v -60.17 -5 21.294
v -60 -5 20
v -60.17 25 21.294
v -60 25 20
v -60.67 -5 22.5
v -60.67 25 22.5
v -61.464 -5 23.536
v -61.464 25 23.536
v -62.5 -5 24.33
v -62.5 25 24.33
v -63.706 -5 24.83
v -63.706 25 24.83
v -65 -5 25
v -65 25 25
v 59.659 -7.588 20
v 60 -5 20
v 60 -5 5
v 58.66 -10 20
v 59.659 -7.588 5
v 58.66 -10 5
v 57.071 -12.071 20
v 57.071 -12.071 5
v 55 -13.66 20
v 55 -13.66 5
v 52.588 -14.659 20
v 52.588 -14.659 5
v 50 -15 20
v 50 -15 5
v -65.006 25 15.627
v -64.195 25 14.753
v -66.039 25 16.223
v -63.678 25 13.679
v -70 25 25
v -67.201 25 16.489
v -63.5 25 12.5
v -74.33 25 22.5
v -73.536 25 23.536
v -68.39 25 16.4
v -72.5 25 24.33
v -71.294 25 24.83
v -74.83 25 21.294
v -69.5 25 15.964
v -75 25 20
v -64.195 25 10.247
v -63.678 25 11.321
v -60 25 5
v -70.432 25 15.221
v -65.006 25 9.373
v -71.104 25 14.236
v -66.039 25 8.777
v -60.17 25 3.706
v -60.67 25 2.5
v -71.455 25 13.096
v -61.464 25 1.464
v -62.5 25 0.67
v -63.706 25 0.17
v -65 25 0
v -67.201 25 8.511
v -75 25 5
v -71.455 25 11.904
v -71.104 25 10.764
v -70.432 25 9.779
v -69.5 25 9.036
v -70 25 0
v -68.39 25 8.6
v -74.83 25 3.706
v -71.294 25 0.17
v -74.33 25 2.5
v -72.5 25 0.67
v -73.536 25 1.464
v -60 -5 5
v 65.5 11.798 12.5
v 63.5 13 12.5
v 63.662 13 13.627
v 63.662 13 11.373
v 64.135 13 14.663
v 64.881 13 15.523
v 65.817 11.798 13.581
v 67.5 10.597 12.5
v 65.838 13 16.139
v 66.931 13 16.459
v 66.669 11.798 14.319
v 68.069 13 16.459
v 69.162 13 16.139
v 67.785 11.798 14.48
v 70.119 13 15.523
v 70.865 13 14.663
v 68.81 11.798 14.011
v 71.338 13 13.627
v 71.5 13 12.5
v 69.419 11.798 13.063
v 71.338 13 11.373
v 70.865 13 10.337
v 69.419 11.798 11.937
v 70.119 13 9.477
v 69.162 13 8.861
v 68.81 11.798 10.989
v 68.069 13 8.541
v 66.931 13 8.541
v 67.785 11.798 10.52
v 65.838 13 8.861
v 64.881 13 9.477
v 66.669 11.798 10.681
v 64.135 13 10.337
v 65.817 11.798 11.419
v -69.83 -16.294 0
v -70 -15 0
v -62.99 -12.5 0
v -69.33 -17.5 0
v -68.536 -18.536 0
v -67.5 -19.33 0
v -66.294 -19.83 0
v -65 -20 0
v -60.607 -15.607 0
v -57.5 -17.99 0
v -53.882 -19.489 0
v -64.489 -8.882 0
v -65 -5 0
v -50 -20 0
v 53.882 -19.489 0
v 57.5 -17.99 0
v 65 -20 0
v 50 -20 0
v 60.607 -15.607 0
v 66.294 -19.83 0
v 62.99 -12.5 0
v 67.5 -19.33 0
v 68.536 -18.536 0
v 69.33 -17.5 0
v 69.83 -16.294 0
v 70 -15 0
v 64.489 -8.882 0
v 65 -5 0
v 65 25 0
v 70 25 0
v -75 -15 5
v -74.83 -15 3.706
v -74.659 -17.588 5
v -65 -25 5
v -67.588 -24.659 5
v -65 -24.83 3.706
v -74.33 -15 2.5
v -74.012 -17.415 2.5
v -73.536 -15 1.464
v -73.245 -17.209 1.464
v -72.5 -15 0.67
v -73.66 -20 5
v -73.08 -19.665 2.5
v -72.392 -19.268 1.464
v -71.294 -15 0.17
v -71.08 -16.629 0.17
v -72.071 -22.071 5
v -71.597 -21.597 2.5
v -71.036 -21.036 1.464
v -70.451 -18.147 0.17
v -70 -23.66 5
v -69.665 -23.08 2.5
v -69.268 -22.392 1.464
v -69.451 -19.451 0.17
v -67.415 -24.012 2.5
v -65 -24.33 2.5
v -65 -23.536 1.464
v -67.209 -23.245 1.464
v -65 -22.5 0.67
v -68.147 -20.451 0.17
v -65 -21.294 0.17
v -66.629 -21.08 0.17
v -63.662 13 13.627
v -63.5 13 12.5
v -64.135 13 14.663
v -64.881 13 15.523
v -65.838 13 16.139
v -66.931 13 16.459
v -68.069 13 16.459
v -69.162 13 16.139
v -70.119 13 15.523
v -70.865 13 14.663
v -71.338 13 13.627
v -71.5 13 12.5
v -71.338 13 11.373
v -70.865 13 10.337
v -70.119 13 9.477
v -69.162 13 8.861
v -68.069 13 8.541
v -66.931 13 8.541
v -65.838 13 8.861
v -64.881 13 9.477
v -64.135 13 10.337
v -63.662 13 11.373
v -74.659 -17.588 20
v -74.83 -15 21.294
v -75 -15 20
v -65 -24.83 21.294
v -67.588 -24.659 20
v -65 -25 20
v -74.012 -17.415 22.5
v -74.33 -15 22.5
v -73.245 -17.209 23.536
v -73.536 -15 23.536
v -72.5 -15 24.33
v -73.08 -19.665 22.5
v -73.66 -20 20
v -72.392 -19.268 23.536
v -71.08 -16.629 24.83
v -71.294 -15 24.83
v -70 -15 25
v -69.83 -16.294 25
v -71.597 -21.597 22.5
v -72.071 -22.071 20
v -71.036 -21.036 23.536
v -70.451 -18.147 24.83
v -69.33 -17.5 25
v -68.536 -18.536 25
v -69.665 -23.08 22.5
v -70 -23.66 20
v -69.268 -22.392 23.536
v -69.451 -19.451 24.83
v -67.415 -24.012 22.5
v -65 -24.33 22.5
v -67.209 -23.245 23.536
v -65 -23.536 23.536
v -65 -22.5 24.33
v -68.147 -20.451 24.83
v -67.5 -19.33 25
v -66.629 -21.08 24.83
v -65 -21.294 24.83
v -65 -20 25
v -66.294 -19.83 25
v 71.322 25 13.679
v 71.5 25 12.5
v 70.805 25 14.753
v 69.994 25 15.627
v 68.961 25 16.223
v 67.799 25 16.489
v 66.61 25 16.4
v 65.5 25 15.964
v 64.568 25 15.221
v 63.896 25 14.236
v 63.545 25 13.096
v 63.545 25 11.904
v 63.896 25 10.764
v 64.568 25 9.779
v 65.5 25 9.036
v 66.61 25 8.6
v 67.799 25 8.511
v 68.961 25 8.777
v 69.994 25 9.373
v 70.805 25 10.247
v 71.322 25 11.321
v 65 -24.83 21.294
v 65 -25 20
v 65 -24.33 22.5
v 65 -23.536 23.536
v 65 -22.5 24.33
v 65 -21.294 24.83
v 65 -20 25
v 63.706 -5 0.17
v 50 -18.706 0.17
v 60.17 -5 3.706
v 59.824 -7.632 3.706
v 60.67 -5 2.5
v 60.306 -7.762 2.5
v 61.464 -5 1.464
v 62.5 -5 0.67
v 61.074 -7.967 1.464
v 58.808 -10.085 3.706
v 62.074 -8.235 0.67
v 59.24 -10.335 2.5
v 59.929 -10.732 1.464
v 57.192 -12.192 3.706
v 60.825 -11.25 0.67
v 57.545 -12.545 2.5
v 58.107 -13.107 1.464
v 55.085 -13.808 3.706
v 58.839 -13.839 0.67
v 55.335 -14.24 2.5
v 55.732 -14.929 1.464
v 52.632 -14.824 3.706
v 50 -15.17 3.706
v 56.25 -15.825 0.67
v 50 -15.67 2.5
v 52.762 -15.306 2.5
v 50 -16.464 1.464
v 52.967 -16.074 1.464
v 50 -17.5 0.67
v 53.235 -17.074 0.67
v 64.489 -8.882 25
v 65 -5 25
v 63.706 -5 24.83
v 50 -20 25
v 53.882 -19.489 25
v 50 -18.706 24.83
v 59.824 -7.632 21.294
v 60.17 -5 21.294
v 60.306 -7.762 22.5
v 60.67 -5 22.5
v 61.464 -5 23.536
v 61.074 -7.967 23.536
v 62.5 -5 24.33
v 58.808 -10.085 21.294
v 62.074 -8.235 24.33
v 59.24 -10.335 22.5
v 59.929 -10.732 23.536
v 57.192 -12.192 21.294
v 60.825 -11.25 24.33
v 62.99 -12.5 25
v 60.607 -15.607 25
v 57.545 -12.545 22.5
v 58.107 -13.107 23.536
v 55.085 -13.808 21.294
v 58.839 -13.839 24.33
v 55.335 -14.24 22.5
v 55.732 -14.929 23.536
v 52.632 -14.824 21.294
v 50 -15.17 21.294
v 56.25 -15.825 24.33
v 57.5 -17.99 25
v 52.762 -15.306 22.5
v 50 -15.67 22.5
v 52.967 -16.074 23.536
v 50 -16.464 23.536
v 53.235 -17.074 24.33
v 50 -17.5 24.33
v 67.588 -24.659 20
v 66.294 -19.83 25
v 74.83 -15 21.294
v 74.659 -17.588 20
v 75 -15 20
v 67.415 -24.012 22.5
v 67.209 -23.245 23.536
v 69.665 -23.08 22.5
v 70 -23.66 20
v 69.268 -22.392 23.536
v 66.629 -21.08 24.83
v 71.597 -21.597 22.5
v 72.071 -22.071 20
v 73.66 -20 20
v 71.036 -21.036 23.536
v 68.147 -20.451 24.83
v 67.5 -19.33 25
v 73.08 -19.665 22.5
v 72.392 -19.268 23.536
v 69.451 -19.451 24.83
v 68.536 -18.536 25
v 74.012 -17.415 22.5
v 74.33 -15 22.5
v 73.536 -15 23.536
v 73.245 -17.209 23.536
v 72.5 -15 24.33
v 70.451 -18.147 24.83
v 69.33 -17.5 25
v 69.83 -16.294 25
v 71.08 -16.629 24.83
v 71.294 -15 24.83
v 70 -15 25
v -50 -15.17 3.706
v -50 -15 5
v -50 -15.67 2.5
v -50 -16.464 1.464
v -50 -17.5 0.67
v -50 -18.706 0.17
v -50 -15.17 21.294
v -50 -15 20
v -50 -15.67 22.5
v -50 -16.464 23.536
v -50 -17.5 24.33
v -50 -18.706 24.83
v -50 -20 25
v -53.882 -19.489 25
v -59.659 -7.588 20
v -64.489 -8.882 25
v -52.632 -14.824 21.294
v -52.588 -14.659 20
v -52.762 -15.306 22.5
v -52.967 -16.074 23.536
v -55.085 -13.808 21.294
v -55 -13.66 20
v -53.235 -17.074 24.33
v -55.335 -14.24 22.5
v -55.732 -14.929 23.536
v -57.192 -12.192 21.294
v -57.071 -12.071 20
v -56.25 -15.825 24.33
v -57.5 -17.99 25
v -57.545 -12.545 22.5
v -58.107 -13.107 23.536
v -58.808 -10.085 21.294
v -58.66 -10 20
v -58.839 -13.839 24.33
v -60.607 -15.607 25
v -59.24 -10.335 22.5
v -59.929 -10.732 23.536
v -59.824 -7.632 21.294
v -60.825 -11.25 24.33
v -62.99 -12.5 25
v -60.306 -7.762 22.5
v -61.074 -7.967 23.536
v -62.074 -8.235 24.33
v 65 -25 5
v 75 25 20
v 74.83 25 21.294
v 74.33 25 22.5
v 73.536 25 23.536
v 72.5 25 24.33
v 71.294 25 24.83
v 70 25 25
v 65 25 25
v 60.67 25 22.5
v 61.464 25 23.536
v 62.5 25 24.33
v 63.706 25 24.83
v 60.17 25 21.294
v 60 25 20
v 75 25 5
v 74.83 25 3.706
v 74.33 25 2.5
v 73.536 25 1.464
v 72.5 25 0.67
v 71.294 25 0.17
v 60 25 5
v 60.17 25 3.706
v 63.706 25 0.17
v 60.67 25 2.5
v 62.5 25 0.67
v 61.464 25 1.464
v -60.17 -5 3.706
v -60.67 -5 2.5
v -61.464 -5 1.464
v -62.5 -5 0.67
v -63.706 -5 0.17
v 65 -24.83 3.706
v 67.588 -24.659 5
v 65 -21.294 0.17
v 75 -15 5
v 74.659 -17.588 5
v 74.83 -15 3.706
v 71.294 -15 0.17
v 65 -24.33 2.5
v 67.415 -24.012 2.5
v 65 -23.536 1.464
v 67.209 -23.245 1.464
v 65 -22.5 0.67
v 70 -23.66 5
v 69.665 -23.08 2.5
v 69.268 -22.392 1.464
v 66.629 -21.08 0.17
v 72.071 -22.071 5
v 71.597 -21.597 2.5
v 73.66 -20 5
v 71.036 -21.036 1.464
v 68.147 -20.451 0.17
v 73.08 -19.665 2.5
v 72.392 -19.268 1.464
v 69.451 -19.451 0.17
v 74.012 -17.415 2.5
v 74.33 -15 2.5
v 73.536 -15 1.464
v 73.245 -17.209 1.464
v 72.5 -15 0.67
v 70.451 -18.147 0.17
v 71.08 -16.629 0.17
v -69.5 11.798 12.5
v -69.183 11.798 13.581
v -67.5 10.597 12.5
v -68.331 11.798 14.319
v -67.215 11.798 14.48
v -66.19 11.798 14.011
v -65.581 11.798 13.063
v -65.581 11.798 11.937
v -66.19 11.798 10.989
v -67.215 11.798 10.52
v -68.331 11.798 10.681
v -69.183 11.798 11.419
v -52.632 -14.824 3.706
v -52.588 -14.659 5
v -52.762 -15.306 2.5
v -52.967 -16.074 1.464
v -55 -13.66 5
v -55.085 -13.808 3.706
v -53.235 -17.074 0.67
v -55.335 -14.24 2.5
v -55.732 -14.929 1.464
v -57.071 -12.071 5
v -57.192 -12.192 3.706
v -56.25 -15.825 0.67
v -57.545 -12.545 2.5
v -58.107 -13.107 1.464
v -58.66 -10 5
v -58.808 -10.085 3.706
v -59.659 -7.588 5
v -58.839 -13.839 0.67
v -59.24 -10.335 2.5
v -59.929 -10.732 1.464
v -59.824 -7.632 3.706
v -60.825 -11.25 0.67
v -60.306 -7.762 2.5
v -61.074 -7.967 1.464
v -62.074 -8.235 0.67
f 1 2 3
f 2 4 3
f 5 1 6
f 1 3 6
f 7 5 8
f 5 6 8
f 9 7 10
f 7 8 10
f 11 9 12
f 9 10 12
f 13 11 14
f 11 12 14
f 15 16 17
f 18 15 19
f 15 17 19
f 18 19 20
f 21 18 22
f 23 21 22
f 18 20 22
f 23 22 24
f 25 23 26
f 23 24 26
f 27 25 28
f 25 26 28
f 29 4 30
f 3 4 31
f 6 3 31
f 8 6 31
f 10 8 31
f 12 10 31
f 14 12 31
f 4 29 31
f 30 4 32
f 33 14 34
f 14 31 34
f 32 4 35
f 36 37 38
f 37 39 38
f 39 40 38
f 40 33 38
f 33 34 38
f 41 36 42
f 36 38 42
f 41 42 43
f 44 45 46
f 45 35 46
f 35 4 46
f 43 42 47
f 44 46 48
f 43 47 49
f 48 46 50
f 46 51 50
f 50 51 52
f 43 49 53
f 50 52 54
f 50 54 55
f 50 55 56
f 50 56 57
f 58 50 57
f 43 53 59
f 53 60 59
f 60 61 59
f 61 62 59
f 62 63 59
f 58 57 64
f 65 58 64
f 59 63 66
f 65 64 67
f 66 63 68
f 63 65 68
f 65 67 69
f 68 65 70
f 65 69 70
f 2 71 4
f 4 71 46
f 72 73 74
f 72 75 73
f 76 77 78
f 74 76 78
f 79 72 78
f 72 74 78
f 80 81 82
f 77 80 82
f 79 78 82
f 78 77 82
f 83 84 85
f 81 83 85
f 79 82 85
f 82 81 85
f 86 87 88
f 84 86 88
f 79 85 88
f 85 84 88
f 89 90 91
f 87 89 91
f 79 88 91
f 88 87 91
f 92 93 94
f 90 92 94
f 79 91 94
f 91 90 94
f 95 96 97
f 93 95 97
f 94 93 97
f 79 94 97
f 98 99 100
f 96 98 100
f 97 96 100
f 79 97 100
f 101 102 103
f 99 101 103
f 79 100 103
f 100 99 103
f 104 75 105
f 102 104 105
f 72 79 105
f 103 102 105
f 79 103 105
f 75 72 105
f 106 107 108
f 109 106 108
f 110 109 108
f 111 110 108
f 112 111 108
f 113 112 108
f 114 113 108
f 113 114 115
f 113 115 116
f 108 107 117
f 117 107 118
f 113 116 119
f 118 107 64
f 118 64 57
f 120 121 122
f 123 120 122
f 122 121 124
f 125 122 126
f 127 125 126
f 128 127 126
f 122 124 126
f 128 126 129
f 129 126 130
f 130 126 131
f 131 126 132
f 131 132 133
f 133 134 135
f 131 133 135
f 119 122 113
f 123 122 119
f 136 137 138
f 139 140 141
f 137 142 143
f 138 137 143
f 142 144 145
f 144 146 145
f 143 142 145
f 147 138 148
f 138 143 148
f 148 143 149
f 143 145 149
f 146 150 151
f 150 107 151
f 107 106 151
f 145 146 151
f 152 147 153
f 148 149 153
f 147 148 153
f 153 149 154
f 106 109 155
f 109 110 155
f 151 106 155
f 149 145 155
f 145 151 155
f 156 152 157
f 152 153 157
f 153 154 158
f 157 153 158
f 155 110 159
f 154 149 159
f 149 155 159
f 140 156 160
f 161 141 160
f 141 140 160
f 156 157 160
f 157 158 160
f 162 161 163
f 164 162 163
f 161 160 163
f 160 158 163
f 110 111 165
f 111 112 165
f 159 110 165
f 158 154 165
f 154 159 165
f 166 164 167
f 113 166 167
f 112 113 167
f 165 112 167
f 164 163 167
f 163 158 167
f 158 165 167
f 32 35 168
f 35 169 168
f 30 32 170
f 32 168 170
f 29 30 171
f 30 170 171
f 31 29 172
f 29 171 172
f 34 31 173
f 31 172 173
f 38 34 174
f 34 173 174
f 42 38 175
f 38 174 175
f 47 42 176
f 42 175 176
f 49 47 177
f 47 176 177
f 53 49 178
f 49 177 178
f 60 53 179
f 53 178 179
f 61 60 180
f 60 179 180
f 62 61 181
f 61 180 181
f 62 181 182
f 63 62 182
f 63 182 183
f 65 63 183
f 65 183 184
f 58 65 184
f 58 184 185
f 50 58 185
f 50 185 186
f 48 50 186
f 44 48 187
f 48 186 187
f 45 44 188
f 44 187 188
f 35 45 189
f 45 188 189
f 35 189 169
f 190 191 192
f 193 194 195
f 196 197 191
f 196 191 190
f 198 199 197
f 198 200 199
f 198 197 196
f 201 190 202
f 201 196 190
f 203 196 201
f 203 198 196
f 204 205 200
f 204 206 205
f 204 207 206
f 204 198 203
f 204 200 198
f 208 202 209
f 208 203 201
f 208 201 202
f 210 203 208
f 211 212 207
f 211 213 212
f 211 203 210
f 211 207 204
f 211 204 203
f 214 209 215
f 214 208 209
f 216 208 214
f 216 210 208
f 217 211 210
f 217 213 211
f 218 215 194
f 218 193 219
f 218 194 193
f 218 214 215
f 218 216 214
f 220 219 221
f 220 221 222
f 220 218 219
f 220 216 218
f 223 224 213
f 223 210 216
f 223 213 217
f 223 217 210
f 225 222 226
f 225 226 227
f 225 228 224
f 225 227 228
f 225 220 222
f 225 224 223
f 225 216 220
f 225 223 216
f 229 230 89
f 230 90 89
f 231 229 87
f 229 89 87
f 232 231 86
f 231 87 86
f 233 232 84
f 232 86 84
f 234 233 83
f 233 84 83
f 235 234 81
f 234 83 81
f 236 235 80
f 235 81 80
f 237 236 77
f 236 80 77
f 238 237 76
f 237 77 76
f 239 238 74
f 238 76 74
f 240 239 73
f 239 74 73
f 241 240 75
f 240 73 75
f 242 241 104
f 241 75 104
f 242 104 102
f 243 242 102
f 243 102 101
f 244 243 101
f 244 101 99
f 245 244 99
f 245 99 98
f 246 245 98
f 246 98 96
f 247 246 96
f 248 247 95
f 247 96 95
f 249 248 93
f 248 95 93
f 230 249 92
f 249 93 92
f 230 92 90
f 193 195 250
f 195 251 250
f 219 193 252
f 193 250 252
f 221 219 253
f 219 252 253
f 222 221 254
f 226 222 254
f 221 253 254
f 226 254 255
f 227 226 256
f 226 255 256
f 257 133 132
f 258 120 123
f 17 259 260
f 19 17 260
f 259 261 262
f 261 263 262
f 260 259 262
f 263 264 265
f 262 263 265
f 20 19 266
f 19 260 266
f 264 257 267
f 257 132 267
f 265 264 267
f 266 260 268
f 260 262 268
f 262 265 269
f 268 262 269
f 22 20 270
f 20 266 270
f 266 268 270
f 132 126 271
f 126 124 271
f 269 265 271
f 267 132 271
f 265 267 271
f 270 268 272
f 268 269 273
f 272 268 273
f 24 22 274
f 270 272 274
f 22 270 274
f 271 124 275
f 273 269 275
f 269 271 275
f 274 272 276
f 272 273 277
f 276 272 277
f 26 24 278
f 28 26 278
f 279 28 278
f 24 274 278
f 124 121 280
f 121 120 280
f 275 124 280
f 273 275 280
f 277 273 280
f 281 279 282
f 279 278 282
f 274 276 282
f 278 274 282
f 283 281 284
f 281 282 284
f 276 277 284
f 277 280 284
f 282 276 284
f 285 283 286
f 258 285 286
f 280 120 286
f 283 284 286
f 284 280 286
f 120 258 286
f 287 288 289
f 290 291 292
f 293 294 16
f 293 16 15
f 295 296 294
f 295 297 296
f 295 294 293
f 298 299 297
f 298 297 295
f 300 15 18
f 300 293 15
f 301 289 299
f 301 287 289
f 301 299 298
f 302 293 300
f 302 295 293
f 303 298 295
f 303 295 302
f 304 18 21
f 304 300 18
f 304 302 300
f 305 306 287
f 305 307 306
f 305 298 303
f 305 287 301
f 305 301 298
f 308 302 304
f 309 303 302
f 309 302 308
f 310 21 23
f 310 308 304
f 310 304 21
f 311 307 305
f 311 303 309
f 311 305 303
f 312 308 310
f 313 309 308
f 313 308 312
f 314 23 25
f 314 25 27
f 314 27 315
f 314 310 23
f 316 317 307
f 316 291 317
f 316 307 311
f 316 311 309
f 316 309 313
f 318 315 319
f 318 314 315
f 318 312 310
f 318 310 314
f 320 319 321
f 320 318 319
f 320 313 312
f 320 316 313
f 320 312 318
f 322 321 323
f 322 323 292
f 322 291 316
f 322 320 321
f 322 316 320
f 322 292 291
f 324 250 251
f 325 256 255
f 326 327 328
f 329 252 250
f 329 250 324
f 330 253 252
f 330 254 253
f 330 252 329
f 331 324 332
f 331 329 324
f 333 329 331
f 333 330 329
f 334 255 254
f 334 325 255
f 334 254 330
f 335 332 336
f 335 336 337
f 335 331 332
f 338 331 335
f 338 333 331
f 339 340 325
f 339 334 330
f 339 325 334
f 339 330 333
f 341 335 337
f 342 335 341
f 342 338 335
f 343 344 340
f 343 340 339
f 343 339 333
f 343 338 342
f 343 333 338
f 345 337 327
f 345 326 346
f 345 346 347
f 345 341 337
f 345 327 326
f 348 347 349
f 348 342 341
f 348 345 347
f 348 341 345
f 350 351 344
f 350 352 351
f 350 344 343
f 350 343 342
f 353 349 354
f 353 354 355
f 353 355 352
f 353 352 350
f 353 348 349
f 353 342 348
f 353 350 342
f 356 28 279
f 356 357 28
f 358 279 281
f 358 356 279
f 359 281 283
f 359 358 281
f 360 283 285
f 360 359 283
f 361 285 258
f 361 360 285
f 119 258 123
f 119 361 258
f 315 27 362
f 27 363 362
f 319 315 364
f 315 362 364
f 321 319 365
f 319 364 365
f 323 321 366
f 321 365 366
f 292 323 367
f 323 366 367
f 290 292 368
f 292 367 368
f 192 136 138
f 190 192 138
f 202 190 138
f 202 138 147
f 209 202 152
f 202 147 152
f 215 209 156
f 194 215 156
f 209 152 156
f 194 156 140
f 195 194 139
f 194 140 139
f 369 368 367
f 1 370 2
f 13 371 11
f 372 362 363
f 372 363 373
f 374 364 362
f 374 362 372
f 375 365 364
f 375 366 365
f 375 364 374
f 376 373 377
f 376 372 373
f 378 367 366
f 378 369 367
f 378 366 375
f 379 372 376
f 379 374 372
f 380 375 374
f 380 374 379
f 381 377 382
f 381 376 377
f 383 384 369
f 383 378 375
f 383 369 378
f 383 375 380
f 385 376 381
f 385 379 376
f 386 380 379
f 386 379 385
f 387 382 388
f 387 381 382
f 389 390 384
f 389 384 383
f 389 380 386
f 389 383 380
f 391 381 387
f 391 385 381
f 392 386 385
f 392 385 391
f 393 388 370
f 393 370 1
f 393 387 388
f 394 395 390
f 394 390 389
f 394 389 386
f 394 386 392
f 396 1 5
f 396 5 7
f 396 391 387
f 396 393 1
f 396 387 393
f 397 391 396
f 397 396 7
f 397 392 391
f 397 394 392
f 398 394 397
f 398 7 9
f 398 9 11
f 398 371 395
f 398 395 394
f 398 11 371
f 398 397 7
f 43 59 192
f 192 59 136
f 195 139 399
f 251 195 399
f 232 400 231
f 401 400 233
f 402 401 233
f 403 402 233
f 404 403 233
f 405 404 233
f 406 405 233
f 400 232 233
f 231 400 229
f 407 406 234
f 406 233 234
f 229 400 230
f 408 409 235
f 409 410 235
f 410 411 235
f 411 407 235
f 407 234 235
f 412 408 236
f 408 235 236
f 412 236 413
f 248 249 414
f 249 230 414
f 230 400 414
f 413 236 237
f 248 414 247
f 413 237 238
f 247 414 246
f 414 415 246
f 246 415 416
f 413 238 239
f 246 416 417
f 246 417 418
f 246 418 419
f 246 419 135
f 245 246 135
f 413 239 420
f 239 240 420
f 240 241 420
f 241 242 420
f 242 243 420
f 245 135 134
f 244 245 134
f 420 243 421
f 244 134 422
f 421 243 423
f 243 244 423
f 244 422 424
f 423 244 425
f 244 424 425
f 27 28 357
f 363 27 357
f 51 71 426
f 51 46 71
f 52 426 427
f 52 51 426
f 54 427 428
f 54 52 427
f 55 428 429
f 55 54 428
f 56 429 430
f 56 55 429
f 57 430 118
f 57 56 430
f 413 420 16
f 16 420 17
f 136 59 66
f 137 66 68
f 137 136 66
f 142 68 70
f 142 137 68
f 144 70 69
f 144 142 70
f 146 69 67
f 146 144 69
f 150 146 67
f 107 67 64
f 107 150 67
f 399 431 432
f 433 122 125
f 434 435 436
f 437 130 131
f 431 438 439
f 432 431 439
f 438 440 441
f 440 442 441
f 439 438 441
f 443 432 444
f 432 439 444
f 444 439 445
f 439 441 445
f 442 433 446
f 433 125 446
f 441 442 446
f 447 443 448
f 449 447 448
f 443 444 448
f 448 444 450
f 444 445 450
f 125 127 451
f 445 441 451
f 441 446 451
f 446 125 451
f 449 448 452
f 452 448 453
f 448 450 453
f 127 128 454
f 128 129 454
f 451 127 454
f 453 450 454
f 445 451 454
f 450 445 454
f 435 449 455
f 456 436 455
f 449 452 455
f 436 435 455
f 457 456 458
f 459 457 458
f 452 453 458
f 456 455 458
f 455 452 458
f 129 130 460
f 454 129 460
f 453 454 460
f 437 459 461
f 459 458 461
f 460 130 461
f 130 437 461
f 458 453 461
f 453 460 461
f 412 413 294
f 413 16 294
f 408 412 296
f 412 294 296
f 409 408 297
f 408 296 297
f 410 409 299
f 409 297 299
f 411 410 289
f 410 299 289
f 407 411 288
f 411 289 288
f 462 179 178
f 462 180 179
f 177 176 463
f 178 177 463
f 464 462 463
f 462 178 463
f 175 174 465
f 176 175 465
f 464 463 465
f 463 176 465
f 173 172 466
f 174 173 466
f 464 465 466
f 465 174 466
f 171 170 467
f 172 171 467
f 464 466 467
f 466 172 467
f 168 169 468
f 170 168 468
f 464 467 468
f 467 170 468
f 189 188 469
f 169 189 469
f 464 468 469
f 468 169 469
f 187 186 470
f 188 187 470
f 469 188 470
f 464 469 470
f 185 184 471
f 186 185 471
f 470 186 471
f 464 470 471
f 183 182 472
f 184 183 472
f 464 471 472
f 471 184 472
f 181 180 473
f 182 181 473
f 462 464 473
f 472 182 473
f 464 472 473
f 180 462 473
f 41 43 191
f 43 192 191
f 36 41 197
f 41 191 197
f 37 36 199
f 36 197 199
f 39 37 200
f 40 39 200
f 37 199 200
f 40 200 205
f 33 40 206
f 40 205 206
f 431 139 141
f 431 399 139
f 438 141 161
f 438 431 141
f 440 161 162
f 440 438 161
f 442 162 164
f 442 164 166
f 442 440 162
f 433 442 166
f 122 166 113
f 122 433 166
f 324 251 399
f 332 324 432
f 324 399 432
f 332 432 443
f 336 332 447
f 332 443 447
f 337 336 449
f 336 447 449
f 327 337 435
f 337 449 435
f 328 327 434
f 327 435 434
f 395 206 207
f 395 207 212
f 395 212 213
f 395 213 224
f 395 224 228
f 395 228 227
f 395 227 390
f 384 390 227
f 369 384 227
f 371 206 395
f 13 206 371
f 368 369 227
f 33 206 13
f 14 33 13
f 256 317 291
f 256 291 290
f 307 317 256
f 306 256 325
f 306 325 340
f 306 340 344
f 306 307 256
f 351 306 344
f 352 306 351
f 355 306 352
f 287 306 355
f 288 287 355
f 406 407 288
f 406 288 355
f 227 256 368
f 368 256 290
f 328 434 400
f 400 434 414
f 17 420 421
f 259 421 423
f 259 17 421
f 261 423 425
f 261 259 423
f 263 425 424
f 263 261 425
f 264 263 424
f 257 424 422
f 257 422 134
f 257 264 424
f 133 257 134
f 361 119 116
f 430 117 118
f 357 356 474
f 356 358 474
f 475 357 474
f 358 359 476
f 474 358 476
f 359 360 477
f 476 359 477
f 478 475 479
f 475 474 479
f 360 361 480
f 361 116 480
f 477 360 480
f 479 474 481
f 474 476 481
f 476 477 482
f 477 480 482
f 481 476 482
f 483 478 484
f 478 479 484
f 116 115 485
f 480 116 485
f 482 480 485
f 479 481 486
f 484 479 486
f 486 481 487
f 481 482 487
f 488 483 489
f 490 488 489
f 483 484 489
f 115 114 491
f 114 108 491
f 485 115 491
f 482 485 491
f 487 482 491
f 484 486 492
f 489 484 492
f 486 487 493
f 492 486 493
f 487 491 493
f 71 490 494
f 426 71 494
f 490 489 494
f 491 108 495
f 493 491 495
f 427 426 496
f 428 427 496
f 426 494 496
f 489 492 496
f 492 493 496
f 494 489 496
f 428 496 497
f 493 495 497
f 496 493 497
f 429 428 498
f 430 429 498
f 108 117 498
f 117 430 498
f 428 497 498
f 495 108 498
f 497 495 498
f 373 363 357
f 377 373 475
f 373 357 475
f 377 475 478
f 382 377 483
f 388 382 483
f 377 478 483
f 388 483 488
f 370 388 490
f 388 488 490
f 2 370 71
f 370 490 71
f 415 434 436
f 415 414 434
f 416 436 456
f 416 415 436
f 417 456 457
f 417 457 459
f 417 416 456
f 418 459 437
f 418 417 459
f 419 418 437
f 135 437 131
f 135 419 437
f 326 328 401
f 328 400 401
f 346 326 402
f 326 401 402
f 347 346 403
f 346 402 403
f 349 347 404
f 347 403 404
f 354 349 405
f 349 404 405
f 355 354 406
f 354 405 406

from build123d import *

# Parameters (mm, degrees)
F1_DEPTH = 25
F2_R     = 4.99999
F4_D     = 8
F4_DEPTH = 12
F4_TIP   = 2.4034424761
F6_D     = 8
F6_DEPTH = 12
F6_TIP   = 2.4034424761


# Not quite as in the source:
# - a fillet or chamfer is up to 0.001 mm smaller than in the source, because OpenCascade refuses the exact size


with BuildPart() as f1:
    # F0 (on Top) → F1 (new body)
    with BuildSketch(Plane.XY):
        with BuildLine():
            Line((75, -15), (75, 25))
            Line((75, 25), (60, 25))
            Line((60, 25), (60, -5))
            ThreePointArc((60, -5), (57.0710678119, -12.0710678119), (50, -15))
            Line((50, -15), (-50, -15))
            ThreePointArc((-50, -15), (-57.0710678119, -12.0710678119), (-60, -5))
            Line((-60, -5), (-60, 25))
            Line((-60, 25), (-75, 25))
            Line((-75, 25), (-75, -15))
            ThreePointArc((-75, -15), (-72.0710678119, -22.0710678119), (-65, -25))
            Line((-65, -25), (65, -25))
            ThreePointArc((65, -25), (72.0710678119, -22.0710678119), (75, -15))
        make_face()
    extrude(amount=F1_DEPTH)

    # F2 (radius 5 in the source; OpenCascade refuses exactly that, so slightly less here)
    f2_edges = [f1.edges().sort_by_distance(p)[0] for p in [
        (-57.071068, -12.071068, 0),
        (-57.071068, -12.071068, 25),
        (-72.071068, -22.071068, 0),
        (-72.071068, -22.071068, 25),
    ]]
    fillet(f2_edges, radius=F2_R)

    # F4
    with Locations(Plane(origin=(0, 25, 0), x_dir=(-1, 0, 0), z_dir=(0, 1, 0))):
        with Locations((67.5, 12.5)):
            Hole(F4_D / 2, depth=F4_DEPTH)
            with Locations((0, 0, -(F4_DEPTH + F4_TIP / 2))):  # 118° drill point
                Cone(0, F4_D / 2, F4_TIP, mode=Mode.SUBTRACT)

    # F6
    with Locations(Plane(origin=(0, 25, 0), x_dir=(-1, 0, 0), z_dir=(0, 1, 0))):
        with Locations((-67.5, 12.5)):
            Hole(F6_D / 2, depth=F6_DEPTH)
            with Locations((0, 0, -(F6_DEPTH + F6_TIP / 2))):  # 118° drill point
                Cone(0, F6_D / 2, F6_TIP, mode=Mode.SUBTRACT)


solid = f1.part
